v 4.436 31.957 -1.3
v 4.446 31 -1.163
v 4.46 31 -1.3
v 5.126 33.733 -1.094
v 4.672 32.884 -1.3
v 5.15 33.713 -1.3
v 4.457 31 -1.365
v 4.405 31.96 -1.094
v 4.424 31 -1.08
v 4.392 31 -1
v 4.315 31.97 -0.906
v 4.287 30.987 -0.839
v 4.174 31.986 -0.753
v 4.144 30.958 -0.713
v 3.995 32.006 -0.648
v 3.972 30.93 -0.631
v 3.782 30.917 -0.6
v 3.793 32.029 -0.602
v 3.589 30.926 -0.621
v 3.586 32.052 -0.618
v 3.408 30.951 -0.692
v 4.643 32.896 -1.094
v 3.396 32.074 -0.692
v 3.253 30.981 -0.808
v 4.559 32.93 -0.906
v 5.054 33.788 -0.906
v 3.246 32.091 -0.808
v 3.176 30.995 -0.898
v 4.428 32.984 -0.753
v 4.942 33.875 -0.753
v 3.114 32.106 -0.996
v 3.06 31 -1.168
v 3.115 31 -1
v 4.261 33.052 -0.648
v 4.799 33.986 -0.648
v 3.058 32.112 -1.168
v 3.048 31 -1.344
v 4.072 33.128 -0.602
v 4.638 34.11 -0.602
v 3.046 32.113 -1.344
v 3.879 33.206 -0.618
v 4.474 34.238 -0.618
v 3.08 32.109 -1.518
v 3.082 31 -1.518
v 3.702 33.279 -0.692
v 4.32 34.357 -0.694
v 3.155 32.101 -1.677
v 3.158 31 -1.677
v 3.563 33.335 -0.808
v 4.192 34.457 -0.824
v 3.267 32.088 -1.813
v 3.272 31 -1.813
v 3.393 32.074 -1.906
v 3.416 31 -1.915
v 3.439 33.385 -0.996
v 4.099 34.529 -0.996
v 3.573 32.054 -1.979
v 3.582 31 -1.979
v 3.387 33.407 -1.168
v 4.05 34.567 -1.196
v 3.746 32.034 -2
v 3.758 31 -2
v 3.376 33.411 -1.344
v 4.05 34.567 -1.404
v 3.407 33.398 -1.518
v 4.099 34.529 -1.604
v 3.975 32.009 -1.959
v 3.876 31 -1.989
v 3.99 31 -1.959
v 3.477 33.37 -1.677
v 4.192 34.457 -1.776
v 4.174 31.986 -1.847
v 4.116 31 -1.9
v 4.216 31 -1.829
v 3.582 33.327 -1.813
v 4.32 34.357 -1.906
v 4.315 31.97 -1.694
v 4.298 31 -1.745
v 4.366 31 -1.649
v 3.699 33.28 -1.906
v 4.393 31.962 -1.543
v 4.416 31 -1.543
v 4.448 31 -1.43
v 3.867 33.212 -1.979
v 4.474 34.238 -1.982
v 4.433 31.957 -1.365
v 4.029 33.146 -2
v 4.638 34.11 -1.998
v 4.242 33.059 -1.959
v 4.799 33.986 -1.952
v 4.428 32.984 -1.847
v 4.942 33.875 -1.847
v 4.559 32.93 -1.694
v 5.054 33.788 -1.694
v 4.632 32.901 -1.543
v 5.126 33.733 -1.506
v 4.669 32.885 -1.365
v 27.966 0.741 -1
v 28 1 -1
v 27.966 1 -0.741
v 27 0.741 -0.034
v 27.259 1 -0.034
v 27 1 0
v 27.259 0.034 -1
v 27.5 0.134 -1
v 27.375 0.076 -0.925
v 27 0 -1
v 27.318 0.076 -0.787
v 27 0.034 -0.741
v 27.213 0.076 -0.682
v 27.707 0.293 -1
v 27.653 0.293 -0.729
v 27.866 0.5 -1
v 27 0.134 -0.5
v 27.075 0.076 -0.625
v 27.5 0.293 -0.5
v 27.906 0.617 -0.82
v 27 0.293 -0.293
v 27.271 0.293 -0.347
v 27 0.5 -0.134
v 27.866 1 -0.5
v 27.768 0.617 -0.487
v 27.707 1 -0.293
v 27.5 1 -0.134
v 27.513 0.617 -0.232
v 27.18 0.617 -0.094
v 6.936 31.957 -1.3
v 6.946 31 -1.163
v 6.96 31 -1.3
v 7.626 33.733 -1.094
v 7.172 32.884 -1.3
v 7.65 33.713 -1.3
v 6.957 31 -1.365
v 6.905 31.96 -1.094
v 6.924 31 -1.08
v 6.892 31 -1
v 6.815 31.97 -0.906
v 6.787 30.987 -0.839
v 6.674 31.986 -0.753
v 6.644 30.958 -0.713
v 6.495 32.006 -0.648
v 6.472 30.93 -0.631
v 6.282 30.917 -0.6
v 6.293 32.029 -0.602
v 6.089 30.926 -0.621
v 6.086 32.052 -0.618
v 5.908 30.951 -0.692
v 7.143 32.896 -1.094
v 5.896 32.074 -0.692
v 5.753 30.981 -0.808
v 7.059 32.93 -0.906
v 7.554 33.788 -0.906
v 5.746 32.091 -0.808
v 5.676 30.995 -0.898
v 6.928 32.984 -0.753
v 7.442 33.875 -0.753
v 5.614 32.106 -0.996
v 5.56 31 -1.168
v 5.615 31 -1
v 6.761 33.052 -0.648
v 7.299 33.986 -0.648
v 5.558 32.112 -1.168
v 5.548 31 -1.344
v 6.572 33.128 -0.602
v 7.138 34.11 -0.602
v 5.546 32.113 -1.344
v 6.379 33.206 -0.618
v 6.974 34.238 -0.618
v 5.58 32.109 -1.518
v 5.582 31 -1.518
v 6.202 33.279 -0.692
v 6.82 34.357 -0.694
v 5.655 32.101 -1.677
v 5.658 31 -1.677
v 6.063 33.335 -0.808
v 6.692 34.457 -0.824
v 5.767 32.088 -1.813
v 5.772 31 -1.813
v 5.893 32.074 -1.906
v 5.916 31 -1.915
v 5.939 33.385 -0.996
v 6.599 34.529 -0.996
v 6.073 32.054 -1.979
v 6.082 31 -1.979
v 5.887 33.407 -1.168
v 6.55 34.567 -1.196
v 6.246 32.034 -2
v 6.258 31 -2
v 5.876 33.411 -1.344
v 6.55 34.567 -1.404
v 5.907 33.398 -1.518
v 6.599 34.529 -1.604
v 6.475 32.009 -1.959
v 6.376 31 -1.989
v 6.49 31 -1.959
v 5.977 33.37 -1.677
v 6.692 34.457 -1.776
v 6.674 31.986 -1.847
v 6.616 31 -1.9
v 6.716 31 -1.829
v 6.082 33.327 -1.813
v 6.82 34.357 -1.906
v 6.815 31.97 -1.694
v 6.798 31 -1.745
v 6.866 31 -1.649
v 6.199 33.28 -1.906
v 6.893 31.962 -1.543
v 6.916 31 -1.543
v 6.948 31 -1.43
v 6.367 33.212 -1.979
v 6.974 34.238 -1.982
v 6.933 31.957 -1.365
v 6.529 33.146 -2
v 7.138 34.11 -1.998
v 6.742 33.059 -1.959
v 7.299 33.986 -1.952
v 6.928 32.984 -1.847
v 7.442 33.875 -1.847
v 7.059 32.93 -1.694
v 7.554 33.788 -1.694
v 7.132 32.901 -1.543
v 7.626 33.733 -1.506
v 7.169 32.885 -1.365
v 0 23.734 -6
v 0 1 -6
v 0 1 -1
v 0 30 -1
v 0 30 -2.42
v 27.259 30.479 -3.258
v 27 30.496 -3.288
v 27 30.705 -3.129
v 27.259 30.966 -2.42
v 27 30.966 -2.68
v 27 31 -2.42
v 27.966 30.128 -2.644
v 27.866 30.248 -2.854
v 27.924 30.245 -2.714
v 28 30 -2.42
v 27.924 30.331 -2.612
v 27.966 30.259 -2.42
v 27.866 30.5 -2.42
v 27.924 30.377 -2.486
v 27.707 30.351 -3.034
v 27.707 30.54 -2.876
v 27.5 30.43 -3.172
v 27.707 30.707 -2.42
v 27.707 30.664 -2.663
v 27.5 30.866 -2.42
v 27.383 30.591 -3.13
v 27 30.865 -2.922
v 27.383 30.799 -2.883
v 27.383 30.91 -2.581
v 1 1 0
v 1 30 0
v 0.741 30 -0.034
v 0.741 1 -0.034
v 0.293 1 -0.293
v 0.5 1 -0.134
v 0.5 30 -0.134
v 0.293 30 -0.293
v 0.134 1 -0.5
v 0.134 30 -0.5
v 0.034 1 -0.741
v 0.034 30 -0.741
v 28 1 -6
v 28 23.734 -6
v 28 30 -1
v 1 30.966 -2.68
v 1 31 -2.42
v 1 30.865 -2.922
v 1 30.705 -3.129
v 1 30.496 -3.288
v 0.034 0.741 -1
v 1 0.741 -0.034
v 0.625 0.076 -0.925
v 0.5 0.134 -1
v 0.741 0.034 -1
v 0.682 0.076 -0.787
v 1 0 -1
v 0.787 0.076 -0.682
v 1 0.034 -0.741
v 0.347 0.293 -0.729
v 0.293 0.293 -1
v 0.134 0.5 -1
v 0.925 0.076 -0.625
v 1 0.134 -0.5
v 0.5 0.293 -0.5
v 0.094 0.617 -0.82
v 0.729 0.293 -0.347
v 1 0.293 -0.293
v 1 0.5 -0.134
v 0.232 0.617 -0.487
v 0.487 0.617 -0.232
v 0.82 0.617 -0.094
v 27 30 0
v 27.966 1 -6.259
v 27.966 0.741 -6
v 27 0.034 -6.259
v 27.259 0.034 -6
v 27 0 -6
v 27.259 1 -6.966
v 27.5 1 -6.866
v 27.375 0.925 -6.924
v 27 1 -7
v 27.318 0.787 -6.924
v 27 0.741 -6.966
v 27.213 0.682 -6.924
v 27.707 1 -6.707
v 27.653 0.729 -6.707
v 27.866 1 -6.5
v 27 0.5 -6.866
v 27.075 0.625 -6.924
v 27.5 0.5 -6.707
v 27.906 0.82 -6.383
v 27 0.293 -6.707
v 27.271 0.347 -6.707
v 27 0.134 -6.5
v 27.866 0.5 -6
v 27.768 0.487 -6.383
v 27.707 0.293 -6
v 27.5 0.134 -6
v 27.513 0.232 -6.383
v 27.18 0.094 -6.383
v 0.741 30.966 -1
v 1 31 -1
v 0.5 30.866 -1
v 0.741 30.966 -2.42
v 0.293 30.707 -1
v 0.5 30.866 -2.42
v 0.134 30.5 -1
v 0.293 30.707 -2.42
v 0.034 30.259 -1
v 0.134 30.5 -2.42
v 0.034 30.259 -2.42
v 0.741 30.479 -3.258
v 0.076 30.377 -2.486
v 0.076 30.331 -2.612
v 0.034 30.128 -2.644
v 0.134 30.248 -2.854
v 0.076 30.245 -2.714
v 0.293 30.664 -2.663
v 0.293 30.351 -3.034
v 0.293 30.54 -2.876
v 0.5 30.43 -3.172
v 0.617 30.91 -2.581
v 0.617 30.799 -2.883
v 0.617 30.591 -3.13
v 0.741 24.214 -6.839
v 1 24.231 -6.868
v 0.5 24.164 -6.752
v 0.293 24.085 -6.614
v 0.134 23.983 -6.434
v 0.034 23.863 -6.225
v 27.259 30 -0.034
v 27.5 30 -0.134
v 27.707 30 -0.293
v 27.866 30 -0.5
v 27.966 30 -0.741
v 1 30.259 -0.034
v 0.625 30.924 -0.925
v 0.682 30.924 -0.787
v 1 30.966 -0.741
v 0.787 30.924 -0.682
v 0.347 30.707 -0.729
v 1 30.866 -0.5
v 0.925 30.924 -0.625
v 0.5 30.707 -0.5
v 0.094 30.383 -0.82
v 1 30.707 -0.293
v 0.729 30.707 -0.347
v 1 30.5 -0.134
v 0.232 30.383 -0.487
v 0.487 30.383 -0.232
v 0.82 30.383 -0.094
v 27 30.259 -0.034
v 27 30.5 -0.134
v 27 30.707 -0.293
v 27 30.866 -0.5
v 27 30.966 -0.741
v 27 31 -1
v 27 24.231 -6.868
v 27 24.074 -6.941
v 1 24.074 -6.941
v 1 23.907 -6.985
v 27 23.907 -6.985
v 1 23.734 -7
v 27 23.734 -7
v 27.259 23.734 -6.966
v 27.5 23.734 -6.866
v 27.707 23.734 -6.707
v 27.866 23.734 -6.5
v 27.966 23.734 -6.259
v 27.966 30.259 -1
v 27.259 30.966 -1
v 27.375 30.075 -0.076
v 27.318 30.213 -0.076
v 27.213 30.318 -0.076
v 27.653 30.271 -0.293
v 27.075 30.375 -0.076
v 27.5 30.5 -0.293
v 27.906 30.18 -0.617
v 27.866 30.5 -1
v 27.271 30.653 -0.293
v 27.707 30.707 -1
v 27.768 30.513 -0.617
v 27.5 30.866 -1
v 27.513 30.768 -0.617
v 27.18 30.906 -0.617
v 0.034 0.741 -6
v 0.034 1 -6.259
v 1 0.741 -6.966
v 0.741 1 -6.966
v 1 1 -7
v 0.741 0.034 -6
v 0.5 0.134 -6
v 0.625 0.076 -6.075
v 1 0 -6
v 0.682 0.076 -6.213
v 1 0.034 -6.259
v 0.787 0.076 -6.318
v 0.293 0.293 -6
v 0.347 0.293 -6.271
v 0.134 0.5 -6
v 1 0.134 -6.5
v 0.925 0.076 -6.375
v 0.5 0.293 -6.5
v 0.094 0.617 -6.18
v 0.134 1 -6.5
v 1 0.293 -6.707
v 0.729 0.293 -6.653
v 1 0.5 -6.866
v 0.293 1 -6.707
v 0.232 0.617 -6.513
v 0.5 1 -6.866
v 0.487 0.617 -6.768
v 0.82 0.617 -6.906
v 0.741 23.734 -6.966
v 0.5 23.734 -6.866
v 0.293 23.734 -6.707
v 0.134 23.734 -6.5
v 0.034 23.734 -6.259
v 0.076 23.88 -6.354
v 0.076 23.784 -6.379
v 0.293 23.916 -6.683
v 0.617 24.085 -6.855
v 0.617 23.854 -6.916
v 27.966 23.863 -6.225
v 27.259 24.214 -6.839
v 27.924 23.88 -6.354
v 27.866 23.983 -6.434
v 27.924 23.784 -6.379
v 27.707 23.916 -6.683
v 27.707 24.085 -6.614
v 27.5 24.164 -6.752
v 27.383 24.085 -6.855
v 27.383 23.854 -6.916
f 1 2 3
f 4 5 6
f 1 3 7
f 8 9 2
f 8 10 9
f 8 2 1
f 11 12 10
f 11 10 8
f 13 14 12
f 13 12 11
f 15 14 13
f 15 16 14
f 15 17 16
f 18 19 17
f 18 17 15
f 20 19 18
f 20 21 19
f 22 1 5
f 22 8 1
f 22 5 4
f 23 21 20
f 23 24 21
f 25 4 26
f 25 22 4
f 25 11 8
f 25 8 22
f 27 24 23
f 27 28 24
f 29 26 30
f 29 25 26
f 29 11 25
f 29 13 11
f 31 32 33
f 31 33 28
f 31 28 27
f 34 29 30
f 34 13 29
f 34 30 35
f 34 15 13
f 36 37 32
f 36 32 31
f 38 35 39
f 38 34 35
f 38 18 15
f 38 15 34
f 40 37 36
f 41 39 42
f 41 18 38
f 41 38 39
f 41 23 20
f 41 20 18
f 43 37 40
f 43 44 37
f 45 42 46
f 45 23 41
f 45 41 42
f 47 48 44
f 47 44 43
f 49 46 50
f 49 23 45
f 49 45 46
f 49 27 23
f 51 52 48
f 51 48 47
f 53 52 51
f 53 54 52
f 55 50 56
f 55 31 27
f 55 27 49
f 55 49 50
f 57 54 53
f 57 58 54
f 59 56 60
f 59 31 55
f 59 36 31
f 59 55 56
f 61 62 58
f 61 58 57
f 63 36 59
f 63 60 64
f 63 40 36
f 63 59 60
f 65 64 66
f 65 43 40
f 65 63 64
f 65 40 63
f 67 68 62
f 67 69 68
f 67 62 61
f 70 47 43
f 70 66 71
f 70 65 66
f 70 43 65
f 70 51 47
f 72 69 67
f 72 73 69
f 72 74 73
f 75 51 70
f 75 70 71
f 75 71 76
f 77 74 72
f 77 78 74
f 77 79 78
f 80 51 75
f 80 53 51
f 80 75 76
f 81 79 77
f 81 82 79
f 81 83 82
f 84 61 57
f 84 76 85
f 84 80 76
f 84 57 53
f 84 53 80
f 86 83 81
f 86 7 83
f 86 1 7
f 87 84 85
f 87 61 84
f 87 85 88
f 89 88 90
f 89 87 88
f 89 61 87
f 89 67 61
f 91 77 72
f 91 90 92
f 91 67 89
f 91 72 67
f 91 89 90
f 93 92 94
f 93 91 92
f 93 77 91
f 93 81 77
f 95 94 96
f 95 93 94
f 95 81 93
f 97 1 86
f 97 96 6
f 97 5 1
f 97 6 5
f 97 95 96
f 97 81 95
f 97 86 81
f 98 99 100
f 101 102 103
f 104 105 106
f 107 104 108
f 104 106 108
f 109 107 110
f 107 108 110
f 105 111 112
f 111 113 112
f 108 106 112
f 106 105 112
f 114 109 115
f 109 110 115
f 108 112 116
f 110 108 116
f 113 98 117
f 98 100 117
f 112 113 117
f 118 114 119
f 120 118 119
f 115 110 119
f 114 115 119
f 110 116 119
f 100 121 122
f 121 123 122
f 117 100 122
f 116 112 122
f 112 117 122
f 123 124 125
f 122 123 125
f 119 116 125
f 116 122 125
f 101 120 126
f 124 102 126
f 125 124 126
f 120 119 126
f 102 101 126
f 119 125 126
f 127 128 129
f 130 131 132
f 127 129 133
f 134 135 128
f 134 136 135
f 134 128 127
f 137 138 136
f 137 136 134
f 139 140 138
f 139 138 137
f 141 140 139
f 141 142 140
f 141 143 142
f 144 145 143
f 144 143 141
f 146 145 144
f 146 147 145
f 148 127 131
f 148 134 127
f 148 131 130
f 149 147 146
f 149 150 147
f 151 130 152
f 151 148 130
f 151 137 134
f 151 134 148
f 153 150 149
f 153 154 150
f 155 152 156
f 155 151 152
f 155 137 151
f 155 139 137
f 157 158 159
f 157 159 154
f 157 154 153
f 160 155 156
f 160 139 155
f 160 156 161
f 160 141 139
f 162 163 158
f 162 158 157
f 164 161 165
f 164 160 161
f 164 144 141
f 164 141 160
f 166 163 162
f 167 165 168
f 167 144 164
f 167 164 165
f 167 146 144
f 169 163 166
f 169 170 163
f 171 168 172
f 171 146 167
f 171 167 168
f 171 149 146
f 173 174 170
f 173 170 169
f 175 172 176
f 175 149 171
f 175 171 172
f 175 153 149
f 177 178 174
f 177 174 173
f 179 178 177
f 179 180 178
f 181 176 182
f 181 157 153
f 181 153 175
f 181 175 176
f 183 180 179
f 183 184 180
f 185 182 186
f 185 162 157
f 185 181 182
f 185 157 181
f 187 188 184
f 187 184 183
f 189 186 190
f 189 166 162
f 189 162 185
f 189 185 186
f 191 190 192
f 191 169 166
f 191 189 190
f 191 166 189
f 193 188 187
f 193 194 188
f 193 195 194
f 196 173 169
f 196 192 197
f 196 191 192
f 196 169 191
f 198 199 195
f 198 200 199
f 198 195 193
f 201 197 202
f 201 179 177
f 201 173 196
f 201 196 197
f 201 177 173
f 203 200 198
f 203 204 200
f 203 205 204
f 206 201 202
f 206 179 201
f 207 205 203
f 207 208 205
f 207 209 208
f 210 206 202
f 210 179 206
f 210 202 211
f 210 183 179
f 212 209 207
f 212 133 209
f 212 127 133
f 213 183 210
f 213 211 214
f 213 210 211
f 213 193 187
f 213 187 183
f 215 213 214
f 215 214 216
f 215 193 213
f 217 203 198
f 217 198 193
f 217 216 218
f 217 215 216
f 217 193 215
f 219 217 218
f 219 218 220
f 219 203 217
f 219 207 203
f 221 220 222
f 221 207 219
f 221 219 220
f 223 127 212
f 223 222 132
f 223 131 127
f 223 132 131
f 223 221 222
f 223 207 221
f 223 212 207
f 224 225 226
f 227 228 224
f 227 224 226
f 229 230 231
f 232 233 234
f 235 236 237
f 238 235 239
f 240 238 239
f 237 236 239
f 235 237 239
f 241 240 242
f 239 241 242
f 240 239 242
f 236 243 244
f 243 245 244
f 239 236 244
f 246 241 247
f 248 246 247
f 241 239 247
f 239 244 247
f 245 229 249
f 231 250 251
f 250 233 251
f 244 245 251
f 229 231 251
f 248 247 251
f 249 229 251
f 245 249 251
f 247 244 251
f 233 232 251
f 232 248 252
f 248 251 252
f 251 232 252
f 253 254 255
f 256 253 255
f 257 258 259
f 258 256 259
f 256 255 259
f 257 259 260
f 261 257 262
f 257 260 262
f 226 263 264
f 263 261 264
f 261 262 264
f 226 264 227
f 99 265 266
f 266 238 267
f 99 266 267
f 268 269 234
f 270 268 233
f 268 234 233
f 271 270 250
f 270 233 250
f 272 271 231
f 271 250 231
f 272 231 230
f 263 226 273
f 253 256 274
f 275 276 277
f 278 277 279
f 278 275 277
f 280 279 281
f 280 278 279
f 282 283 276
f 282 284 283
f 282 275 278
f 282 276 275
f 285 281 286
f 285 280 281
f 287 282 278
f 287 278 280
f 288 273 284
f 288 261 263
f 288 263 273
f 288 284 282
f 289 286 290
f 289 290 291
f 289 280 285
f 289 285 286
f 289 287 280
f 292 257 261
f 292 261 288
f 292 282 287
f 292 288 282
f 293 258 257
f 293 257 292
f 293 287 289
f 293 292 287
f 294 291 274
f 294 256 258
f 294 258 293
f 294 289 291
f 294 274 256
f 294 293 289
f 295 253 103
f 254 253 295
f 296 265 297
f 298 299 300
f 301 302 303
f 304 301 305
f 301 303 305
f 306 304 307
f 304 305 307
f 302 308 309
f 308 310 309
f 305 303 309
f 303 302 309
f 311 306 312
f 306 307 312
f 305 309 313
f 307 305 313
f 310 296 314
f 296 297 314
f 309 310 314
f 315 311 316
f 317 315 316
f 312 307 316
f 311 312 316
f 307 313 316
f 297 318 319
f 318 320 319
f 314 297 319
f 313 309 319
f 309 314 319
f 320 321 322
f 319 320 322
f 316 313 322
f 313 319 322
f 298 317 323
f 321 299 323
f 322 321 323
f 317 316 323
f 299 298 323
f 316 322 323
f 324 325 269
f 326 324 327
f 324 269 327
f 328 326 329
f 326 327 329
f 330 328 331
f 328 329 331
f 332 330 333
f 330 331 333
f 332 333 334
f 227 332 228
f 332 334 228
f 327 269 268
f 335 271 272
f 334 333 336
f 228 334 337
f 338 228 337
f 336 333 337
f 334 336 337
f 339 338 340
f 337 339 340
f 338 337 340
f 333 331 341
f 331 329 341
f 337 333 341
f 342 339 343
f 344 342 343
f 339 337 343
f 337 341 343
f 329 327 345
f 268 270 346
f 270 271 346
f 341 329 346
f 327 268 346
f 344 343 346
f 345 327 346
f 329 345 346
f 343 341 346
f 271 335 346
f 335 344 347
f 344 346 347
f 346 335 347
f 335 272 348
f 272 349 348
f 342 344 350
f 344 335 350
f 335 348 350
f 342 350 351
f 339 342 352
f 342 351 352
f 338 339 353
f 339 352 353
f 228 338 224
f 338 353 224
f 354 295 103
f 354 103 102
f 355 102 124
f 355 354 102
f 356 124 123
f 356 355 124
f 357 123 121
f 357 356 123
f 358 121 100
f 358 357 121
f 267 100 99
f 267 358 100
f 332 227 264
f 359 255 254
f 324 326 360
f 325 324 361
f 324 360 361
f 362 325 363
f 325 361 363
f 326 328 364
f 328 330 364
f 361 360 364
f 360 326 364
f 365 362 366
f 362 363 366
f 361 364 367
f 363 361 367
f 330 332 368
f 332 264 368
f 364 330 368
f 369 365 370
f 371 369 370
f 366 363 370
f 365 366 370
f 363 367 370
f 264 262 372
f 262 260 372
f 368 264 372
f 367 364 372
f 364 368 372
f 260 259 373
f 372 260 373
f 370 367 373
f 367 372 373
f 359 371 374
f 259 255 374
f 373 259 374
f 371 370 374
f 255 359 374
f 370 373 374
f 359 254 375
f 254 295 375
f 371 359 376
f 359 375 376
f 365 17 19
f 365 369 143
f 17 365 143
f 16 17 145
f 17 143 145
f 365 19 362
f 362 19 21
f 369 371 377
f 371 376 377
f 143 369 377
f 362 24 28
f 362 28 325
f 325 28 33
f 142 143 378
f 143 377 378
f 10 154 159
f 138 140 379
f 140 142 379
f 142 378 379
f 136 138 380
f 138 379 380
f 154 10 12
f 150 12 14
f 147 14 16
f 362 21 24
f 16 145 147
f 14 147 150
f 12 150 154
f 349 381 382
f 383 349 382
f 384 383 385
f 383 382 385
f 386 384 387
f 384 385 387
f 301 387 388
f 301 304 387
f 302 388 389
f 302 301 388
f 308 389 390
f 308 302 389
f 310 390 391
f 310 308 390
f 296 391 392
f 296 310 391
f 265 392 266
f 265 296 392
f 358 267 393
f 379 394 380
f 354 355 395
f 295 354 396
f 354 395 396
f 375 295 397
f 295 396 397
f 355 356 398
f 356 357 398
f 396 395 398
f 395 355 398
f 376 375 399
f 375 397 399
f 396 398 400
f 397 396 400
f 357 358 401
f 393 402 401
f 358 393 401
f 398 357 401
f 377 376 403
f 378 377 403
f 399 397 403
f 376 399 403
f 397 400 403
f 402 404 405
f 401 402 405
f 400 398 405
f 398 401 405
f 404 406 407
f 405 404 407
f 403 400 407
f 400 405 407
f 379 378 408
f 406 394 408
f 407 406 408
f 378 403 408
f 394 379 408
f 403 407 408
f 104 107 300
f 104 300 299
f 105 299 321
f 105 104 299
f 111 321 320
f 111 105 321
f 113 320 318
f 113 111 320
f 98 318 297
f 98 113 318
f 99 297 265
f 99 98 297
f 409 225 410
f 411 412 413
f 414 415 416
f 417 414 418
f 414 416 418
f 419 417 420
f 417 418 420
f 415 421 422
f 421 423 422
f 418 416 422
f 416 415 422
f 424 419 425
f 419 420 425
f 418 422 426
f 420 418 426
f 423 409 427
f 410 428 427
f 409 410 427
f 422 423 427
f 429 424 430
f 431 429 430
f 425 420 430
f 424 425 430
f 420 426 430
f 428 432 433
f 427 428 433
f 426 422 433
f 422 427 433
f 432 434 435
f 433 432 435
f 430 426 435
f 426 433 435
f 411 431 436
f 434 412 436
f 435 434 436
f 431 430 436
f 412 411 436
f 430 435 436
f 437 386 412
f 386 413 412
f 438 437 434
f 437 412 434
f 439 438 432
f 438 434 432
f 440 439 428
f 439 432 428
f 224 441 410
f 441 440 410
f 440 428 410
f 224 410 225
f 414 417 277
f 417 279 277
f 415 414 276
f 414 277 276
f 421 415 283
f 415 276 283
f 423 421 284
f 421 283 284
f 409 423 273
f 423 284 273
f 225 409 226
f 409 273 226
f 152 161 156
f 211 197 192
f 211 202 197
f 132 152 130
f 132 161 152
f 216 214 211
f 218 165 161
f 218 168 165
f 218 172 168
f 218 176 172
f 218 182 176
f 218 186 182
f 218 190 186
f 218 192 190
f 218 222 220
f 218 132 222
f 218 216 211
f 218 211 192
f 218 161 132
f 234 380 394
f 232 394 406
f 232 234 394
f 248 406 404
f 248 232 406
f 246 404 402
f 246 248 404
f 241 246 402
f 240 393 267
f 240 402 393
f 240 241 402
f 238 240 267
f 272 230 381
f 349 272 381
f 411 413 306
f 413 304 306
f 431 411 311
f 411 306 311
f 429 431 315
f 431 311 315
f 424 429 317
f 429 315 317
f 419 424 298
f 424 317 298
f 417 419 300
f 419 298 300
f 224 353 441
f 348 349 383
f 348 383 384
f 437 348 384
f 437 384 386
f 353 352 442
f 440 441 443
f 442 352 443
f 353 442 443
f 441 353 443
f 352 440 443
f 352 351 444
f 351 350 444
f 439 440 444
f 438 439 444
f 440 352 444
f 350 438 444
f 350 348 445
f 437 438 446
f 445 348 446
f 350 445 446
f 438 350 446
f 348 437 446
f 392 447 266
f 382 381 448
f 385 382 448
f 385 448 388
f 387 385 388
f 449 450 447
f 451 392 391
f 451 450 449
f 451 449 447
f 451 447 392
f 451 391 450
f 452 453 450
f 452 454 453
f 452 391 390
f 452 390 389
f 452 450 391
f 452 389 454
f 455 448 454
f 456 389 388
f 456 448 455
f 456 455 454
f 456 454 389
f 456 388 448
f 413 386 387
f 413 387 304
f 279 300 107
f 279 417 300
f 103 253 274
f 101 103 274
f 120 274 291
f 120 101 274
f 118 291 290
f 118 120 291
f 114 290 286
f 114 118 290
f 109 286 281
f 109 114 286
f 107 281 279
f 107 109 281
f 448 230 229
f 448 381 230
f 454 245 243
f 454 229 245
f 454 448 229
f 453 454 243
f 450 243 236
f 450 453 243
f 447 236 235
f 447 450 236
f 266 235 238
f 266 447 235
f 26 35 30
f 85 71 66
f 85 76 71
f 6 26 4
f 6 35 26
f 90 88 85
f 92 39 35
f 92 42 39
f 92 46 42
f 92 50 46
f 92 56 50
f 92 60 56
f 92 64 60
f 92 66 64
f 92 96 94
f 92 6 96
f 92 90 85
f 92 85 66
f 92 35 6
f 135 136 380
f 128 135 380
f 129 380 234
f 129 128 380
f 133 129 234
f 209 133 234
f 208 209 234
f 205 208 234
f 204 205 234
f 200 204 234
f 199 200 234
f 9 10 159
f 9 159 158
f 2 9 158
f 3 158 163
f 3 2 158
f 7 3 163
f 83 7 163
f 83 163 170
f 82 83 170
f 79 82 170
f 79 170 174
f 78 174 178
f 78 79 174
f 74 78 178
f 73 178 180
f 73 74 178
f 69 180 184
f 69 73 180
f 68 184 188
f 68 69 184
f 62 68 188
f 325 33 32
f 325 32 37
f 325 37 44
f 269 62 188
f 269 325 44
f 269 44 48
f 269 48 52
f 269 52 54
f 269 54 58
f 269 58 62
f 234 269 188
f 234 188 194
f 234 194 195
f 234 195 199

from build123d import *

# Parameters (mm, degrees)
EXTRUDE_1_DEPTH        = 28
FILLET_1_R             = 1
SWEEP_1_PROFILE_R      = 0.7
PATTERN_LINEAR_1_COUNT = 2
PATTERN_LINEAR_1_PITCH = 2.5


with BuildPart() as part:
    # 草图1 → 凸台-拉伸1 (new body)
    with BuildSketch(Plane(origin=(0, 0, 0), x_dir=(0, 0, -1), z_dir=(1, 0, 0))):
        Polygon((0, 0), (0, 31), (3, 31), (7, 24), (7, 0), align=None)
    extrude(amount=EXTRUDE_1_DEPTH)

    # 圆角1
    fillet_1_edges = [part.edges().sort_by_distance(p)[0] for p in [
        (28, 27.5, -5),
        (28, 31, -1.5),
        (28, 15.5, 0),
        (28, 0, -3.5),
        (0, 15.5, 0),
        (0, 31, -1.5),
        (0, 27.5, -5),
        (0, 12, -7),
        (0, 0, -3.5),
        (28, 12, -7),
        (14, 0, 0),
        (14, 31, 0),
        (14, 31, -3),
        (14, 24, -7),
        (14, 0, -7),
    ]]
    fillet(fillet_1_edges, radius=FILLET_1_R)

    # 扫描1: sweep along a path in 草图2
    with BuildLine(Plane.XY.offset(-1.3)) as sweep_1_path:
        ThreePointArc((4.647498894, 28.922984251), (3.714501518, 31.52399057), (4.597001461, 34.142561139))
    # 扫描1 profile (on start of the path) → 扫描1 (sweep)
    with BuildSketch(Plane(origin=(4.647498894, 28.922984251, -1.3), x_dir=(0.778109821, 0.628128256, 0), z_dir=(-0.628128256, 0.778109821, 0))):
        Circle(SWEEP_1_PROFILE_R)
    sweep_1 = sweep(path=sweep_1_path.line)

    # 阵列(线性)1: 扫描1 ×2
    with Locations(*[(i * PATTERN_LINEAR_1_PITCH, 0, 0) for i in range(1, PATTERN_LINEAR_1_COUNT)]):
        add(sweep_1)


solid = part.part
